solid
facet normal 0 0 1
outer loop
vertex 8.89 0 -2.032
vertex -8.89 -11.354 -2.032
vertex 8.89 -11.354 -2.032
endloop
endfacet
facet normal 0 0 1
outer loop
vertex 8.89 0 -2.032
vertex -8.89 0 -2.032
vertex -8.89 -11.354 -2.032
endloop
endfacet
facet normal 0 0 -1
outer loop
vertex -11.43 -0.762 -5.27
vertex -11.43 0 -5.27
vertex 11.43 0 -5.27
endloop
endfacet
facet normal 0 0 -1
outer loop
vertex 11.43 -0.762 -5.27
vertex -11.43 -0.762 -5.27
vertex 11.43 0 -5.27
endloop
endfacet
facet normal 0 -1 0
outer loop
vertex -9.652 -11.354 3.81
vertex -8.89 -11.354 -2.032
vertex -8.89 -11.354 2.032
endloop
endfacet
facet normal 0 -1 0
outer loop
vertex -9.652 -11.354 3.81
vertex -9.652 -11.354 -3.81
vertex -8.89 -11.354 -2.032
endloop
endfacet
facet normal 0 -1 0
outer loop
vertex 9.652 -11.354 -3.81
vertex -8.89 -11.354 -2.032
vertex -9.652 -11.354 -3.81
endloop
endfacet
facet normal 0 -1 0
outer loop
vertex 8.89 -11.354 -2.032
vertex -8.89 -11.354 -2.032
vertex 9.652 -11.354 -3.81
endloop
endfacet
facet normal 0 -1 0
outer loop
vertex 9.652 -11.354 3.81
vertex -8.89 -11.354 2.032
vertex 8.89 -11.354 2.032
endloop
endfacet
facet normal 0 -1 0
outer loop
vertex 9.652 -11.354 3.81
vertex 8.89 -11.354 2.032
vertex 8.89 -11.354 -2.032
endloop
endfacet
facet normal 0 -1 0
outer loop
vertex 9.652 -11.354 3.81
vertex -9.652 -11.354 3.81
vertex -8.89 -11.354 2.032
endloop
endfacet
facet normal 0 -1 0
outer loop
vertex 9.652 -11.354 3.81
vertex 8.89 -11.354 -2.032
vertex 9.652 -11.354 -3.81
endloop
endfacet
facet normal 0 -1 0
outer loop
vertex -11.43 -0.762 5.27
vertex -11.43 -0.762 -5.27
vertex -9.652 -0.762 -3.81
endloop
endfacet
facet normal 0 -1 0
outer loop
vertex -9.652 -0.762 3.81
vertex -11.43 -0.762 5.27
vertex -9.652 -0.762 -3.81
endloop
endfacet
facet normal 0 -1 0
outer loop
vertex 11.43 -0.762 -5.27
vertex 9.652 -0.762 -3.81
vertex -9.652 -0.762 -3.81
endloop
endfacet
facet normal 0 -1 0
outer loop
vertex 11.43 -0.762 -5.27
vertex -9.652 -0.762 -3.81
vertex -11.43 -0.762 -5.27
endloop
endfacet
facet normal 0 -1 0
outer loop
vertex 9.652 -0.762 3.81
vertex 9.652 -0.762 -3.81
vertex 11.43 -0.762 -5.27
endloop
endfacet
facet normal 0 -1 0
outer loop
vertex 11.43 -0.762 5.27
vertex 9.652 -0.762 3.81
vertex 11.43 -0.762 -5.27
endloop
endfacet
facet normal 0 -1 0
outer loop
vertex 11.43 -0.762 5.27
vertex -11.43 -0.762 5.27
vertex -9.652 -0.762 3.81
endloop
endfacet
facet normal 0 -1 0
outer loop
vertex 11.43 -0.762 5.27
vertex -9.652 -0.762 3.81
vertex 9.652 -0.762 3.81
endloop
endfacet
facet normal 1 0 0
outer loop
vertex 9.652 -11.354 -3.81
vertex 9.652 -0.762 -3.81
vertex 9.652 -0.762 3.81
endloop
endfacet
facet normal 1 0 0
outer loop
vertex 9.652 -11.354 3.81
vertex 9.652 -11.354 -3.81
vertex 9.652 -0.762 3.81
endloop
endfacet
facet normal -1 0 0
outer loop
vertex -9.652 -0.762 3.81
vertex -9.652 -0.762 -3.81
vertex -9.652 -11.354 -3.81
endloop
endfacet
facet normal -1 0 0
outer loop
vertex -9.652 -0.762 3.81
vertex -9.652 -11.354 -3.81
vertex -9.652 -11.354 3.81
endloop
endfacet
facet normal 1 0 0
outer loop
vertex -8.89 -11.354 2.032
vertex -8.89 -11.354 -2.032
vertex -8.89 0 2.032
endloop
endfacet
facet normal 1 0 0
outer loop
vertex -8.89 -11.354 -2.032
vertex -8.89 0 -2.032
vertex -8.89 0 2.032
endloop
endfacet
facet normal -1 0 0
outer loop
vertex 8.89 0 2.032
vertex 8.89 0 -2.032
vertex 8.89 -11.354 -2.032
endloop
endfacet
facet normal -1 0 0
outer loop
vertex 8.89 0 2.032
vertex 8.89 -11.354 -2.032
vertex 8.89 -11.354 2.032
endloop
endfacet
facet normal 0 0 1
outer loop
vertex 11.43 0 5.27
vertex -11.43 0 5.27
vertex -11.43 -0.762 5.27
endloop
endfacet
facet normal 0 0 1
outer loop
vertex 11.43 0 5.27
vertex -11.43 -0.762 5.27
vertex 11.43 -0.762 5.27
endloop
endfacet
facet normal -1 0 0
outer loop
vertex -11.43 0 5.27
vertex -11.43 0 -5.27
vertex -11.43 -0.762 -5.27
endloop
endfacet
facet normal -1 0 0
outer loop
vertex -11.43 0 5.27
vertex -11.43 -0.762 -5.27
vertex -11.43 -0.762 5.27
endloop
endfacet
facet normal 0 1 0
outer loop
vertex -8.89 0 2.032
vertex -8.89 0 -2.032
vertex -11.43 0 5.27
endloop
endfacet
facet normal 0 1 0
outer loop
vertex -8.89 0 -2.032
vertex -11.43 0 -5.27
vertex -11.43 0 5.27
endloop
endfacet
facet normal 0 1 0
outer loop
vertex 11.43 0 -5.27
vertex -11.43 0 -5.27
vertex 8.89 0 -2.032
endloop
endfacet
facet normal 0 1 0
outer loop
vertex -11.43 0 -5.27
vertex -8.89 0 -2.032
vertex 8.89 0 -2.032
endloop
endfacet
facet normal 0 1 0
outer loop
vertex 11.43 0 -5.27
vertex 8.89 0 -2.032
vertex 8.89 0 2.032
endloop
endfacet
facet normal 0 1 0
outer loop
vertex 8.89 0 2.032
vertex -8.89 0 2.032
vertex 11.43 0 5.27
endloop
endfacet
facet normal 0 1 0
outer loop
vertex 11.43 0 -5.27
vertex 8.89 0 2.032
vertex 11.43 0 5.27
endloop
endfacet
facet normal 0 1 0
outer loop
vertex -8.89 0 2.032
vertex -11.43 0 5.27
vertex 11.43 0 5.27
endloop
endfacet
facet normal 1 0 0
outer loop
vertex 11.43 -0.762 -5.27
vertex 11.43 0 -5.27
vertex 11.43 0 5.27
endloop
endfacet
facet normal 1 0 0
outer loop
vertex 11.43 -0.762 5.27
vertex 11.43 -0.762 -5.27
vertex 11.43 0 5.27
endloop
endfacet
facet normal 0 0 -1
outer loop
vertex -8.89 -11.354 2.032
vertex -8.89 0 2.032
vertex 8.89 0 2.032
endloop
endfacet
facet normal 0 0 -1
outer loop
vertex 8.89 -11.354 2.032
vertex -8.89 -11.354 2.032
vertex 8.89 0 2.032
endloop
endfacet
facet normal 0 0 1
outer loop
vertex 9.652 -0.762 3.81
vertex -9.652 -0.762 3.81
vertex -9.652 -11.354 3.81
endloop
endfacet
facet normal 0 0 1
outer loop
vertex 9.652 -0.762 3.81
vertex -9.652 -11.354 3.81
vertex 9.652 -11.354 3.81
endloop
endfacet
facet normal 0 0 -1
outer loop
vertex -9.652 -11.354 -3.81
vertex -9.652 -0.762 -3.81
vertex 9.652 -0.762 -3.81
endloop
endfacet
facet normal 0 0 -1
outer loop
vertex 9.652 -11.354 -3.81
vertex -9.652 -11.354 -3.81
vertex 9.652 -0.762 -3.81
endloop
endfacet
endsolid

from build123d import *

# Parameters (mm, degrees)
F0_W     = 22.86
F0_H     = 10.541
F0_W_2   = 17.78
F0_H_2   = 4.064
F1_DEPTH = 0.762
F2_W     = 19.304
F2_H     = 7.62
F2_W_2   = 17.78
F2_H_2   = 4.064
F3_DEPTH = 10.5918


with BuildPart() as f1:
    # F0 (on Front) → F1 (new body)
    with BuildSketch(Plane.XZ):
        Rectangle(F0_W, F0_H)
        Rectangle(F0_W_2, F0_H_2, mode=Mode.SUBTRACT)
    extrude(amount=F1_DEPTH)

    # F2 (on face) → F3 (join)
    with BuildSketch(Plane.XZ.offset(0.762)):
        Rectangle(F2_W, F2_H)
        Rectangle(F2_W_2, F2_H_2, mode=Mode.SUBTRACT)
    extrude(amount=F3_DEPTH)


solid = f1.part
